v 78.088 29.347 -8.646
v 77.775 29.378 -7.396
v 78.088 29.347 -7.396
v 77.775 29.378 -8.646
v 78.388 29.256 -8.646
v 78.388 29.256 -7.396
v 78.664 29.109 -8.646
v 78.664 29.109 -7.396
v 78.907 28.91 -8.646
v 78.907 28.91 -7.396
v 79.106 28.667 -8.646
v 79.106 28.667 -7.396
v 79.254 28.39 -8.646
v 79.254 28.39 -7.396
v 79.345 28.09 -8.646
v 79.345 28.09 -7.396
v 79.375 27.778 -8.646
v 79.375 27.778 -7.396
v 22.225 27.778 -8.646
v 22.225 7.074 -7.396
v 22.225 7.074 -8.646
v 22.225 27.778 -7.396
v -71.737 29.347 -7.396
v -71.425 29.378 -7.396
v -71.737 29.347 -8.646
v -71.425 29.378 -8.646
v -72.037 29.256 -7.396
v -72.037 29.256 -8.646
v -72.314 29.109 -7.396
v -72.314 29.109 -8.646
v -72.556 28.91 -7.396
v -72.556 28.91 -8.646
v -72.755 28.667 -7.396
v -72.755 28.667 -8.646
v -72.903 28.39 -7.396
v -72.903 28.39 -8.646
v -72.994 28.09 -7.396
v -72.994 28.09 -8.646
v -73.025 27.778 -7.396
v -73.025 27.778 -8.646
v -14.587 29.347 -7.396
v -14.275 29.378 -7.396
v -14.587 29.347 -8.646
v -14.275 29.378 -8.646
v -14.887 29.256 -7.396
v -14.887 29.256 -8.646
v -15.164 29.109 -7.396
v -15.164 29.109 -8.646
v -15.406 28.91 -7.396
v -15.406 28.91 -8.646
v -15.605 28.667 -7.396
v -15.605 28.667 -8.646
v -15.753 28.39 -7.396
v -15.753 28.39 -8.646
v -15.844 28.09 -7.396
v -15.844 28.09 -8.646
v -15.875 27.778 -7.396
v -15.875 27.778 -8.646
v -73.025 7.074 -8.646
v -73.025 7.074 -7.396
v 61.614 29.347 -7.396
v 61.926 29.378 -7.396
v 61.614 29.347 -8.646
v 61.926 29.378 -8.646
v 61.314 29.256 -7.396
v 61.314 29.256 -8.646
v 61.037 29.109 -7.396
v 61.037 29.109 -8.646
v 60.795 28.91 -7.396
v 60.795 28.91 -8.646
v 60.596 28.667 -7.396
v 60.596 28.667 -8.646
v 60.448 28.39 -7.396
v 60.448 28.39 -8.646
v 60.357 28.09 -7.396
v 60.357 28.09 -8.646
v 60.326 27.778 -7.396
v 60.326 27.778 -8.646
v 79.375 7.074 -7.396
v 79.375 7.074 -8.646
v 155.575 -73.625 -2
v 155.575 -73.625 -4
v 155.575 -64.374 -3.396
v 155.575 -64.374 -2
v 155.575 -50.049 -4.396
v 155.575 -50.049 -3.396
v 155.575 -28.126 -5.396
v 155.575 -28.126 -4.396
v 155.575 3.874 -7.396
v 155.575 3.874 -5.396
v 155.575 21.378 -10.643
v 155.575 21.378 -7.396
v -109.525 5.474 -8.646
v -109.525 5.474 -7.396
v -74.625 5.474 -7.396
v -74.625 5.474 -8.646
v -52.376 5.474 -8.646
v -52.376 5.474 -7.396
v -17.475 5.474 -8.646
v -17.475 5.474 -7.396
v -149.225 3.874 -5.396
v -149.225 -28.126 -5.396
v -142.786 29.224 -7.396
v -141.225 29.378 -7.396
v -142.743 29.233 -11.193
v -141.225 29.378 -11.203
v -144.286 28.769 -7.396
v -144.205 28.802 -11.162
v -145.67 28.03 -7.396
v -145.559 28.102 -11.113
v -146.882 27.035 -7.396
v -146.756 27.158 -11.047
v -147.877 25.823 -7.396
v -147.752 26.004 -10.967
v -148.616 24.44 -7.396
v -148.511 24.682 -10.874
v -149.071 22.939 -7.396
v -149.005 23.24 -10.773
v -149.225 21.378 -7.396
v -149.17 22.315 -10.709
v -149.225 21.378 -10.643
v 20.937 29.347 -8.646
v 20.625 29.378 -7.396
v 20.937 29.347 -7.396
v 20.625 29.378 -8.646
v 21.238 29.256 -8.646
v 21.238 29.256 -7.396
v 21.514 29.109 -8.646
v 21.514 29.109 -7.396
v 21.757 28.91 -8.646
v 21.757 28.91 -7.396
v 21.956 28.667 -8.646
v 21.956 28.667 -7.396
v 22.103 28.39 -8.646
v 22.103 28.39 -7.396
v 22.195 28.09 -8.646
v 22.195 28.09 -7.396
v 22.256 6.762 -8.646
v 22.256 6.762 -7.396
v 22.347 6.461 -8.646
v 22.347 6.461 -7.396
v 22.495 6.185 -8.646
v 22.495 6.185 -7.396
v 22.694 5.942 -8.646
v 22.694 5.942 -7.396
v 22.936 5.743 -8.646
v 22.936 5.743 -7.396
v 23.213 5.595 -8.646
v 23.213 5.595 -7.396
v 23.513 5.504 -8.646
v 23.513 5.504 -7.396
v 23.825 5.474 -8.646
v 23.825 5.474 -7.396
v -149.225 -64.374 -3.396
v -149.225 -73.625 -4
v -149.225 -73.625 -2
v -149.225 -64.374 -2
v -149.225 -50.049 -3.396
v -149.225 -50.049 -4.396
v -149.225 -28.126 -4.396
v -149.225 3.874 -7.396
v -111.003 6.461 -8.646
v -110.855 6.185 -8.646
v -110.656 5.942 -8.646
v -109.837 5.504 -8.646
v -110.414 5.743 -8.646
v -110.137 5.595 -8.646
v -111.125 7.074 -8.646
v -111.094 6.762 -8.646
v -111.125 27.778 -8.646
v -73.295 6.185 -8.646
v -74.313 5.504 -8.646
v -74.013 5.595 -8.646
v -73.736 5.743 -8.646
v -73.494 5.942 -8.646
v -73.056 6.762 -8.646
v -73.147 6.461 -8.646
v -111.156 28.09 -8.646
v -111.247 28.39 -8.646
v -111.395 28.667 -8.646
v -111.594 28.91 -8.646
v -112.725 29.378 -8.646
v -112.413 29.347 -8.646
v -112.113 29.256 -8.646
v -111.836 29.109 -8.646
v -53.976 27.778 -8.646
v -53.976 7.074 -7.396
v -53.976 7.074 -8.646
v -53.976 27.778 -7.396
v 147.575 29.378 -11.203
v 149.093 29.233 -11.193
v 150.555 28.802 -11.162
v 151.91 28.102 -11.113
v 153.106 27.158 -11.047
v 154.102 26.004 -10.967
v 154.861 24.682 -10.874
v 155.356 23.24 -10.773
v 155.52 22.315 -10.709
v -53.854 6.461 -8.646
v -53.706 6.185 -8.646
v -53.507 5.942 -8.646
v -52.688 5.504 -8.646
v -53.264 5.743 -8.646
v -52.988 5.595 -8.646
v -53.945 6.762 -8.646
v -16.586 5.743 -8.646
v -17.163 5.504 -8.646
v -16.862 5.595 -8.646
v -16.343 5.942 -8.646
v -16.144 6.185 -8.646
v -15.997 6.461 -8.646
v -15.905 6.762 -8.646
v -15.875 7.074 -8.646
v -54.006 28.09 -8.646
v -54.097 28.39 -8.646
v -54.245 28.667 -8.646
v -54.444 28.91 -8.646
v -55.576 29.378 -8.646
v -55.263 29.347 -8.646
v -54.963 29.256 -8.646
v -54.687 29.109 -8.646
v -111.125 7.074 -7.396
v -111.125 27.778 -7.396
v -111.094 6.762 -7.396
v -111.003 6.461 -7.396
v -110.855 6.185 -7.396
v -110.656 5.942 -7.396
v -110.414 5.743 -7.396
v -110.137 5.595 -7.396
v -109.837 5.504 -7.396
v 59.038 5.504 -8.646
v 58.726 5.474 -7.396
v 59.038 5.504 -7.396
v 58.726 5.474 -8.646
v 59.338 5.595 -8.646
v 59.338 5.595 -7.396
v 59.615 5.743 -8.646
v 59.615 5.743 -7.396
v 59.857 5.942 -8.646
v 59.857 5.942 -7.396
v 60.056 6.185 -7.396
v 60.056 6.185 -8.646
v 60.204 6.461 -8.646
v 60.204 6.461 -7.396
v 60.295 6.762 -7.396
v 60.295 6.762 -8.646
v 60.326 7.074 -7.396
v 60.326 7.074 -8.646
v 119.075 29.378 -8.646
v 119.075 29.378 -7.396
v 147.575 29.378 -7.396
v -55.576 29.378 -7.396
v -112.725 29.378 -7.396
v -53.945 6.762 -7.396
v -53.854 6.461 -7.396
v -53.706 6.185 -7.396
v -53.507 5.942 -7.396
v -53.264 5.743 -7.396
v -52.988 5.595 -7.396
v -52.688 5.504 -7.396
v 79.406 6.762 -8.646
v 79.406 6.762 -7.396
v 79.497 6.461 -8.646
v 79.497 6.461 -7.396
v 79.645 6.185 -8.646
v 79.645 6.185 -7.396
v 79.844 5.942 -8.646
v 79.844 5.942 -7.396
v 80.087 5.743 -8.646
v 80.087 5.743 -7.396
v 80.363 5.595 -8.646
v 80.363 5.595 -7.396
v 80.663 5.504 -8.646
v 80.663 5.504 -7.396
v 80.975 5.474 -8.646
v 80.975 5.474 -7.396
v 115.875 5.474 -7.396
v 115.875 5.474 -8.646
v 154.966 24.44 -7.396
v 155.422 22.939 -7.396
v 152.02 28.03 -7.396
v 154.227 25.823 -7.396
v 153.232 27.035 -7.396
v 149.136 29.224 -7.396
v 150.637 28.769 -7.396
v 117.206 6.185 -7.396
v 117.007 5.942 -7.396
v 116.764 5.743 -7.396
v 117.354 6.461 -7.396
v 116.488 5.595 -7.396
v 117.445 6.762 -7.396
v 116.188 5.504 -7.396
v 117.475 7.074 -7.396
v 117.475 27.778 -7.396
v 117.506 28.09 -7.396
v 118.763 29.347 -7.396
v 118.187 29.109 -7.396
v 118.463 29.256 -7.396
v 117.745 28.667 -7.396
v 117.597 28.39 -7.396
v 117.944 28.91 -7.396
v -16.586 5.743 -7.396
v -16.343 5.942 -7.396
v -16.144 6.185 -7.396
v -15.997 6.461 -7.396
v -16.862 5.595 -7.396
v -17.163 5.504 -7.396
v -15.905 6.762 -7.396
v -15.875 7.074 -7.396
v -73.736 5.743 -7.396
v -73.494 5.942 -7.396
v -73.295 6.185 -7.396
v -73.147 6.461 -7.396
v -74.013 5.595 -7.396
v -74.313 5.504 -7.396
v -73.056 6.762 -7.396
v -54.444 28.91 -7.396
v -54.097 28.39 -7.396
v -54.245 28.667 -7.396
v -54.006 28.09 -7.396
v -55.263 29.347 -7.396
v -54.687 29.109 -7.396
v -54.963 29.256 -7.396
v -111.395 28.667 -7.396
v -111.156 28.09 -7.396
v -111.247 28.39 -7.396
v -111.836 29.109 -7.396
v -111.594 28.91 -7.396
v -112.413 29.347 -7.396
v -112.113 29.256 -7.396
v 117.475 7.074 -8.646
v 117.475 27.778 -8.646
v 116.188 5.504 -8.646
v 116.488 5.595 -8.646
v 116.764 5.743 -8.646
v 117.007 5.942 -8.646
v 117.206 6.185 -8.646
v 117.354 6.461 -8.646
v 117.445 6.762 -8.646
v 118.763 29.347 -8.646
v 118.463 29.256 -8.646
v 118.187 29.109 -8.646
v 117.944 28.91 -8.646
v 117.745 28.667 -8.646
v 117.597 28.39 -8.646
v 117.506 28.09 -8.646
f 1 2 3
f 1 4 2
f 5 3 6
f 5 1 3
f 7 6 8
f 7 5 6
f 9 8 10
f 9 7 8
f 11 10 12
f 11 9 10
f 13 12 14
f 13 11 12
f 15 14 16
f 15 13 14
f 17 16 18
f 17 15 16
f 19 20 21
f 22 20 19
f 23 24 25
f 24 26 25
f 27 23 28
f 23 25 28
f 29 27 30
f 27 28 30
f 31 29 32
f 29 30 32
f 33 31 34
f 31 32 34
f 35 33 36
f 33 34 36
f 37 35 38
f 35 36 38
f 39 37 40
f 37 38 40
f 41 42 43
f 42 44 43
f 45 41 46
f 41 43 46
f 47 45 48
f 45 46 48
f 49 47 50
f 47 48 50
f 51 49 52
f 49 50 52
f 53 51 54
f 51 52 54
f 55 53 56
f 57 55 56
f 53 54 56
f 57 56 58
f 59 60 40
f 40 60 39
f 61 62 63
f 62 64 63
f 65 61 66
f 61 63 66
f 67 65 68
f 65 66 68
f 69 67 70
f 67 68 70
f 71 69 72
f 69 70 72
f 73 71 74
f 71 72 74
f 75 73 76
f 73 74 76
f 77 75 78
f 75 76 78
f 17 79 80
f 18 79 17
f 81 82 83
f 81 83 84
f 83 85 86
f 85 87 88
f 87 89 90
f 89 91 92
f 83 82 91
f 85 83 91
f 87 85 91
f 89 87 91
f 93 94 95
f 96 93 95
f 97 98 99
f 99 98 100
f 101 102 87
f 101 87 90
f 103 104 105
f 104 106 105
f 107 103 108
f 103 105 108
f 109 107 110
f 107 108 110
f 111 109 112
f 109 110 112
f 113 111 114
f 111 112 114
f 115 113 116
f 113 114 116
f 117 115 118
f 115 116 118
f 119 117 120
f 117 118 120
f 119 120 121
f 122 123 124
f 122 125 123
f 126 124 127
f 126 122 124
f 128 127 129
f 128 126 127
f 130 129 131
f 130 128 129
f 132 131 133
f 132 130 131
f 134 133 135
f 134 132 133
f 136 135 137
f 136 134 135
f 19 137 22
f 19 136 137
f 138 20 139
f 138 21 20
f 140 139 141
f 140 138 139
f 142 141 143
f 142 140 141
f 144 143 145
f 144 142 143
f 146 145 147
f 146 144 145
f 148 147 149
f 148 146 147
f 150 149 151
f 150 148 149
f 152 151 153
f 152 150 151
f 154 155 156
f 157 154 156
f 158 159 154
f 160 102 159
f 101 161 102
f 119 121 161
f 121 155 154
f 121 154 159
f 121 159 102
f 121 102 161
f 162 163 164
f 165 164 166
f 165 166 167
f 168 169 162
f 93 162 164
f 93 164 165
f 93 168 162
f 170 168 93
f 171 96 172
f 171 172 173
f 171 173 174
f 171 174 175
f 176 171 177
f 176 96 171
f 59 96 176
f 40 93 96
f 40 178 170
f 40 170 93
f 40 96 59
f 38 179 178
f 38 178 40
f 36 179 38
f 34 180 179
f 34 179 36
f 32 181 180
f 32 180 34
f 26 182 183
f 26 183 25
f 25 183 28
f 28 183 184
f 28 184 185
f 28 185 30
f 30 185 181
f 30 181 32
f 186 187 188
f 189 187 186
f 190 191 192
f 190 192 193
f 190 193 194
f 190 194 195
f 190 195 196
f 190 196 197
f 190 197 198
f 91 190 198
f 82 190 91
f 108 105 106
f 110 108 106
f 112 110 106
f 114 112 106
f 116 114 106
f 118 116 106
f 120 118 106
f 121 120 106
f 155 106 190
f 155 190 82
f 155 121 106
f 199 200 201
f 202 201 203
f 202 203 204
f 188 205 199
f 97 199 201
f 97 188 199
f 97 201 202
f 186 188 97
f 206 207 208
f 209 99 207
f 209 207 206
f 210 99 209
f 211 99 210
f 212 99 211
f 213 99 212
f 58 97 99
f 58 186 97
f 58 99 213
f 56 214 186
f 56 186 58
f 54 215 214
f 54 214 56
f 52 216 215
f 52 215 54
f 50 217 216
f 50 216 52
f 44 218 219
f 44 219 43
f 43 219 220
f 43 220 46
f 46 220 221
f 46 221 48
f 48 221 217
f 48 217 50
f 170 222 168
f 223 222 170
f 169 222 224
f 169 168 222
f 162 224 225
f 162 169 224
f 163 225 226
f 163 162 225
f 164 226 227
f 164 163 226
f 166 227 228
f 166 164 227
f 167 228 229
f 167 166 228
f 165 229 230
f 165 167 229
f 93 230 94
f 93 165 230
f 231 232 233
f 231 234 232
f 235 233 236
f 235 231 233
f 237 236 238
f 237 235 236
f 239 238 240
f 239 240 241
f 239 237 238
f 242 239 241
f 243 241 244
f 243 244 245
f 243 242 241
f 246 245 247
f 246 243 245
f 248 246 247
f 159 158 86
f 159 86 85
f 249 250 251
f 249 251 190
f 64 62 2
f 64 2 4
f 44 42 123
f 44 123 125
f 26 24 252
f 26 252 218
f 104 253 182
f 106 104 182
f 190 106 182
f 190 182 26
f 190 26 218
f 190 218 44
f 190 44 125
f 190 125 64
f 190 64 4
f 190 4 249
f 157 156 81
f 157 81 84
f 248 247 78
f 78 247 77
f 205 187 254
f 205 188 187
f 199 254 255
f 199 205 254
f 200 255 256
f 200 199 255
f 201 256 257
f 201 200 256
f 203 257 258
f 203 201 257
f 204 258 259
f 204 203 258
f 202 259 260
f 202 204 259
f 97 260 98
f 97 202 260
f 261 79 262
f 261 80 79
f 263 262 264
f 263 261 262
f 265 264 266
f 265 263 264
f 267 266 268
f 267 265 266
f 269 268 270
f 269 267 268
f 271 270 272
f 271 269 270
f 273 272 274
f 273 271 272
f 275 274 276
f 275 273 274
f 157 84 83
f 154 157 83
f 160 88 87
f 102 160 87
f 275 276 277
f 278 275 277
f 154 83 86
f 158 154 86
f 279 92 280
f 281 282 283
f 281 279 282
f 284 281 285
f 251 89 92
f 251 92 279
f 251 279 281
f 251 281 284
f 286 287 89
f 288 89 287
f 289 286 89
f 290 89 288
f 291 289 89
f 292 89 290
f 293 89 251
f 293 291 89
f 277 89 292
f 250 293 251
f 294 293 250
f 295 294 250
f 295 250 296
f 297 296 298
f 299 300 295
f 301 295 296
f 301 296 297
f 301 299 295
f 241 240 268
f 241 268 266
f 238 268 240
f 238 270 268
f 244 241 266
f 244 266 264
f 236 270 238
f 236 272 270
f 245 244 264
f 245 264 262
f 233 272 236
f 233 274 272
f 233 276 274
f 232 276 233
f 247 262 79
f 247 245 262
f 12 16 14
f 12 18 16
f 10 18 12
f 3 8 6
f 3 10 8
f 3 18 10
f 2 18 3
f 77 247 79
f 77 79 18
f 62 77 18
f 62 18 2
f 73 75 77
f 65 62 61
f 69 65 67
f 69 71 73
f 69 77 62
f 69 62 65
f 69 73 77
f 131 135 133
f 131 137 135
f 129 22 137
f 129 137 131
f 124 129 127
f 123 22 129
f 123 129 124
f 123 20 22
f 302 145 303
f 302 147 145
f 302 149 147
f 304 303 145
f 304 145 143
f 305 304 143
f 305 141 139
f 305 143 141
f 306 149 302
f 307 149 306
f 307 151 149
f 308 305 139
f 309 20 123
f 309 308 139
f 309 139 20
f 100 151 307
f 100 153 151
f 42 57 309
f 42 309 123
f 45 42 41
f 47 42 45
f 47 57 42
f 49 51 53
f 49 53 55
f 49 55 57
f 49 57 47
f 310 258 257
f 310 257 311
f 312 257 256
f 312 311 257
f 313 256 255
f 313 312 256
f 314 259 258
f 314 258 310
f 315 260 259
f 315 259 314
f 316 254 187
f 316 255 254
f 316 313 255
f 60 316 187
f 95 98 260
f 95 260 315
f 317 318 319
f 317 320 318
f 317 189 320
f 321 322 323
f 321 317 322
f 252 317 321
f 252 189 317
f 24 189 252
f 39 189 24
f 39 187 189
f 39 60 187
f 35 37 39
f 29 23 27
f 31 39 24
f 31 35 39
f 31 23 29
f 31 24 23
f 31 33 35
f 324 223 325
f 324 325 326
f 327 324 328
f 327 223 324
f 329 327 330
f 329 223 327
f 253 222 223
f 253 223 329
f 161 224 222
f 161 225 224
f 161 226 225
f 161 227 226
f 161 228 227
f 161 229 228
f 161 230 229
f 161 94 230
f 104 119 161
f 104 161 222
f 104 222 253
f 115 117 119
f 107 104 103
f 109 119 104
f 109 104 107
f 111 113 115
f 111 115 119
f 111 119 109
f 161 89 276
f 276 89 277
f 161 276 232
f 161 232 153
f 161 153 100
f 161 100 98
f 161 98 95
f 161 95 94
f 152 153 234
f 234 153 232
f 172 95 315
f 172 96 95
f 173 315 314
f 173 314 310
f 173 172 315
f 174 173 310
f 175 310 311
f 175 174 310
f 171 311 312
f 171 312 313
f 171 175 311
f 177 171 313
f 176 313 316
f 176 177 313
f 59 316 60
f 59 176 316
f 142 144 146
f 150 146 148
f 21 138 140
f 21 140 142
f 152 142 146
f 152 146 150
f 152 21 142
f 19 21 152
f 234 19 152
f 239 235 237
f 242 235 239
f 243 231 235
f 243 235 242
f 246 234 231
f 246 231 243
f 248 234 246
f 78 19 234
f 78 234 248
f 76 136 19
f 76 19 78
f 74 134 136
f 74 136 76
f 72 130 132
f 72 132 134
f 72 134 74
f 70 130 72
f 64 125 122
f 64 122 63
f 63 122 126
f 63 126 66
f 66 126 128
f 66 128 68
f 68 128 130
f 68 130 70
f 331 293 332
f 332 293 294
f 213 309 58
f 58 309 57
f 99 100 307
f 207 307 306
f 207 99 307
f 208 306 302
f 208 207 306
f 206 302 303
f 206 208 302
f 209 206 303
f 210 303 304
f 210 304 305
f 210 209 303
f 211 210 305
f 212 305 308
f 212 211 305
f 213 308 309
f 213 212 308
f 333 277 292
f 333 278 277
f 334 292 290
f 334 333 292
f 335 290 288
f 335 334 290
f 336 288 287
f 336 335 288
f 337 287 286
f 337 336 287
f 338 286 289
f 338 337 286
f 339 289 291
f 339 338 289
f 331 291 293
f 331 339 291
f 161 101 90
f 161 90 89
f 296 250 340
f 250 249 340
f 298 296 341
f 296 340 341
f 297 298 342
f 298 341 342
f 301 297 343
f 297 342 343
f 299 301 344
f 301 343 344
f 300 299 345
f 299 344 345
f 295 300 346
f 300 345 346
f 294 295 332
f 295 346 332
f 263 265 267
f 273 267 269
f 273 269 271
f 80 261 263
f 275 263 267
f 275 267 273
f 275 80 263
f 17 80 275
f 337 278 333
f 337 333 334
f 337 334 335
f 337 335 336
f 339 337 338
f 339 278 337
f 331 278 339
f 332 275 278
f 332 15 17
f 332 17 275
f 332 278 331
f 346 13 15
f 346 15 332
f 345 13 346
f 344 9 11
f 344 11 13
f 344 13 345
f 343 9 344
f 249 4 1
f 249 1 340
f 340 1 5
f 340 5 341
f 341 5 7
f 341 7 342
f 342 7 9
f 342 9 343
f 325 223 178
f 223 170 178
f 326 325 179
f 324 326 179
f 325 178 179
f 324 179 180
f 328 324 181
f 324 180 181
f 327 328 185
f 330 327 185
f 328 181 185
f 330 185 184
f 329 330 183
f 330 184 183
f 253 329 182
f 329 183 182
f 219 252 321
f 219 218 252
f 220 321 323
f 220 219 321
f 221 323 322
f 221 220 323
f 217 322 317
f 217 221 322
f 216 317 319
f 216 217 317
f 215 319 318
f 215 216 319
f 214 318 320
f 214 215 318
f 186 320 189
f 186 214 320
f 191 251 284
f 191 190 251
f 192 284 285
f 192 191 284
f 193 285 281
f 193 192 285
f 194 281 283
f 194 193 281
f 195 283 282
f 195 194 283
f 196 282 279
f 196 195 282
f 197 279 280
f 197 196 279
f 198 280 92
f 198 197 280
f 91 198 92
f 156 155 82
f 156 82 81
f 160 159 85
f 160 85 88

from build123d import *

# Parameters (mm, degrees)
BOSS_EXTRUDE1_DEPTH = 304.800275
FILLET1_R           = 8
SKETCH2_W           = 38.10085
SKETCH2_H           = 23.904524524
SKETCH2_W_2         = 38.1
CUT_EXTRUDE1_DEPTH  = 1.25
FILLET2_R           = 1.6
FILLET3_R           = 1.6


with BuildPart() as part:
    # Sketch1 → Boss-Extrude1 (new body)
    with BuildSketch(Plane.ZY.offset(149.225)):
        Polygon((-2, -64.3742065), (-3.3962, -64.3742065), (-3.3962, -50.048837521), (-4.3962, -50.048837521), (-4.3962, -28.126347), (-5.3962, -28.126347), (-5.3962, 3.873653), (-7.3962, 3.873653), (-7.3962, 29.378177524), (-11.202667042, 29.378177524), (-4, -73.62476), (-2, -73.62476), align=None)
    extrude(amount=-BOSS_EXTRUDE1_DEPTH)

    # Fillet1
    fillet1_edges = [part.edges().sort_by_distance(p)[0] for p in [
        (-149.225, 29.378177524, -9.299433521),
        (155.575275, 29.378177524, -9.299433521),
    ]]
    fillet(fillet1_edges, radius=FILLET1_R)

    # Sketch2 → Cut-Extrude1 (cut)
    with BuildSketch(Plane.XY.offset(-7.3962)):
        with Locations((41.2757, 17.425915262)):
            Rectangle(SKETCH2_W, SKETCH2_H)
        with Locations((-92.074875, 17.425915262)):
            Rectangle(SKETCH2_W_2, SKETCH2_H)
        with Locations((-34.92515, 17.425915262)):
            Rectangle(SKETCH2_W, SKETCH2_H)
        with Locations((98.425425, 17.425915262)):
            Rectangle(SKETCH2_W_2, SKETCH2_H)
    extrude(amount=-CUT_EXTRUDE1_DEPTH, mode=Mode.SUBTRACT)

    # Fillet2
    fillet2_edges = [part.edges().sort_by_distance(p)[0] for p in [
        (-111.124875, 5.473653, -8.0212),
        (-73.024875, 5.473653, -8.0212),
        (-53.975575, 5.473653, -8.0212),
        (-15.874725, 5.473653, -8.0212),
        (60.326125, 5.473653, -8.0212),
        (22.225275, 5.473653, -8.0212),
        (117.475425, 5.473653, -8.0212),
        (79.375425, 5.473653, -8.0212),
    ]]
    fillet(fillet2_edges, radius=FILLET2_R)

    # Fillet3
    fillet3_edges = [part.edges().sort_by_distance(p)[0] for p in [
        (-111.124875, 29.378177524, -8.0212),
        (-73.024875, 29.378177524, -8.0212),
        (-53.975575, 29.378177524, -8.0212),
        (-15.874725, 29.378177524, -8.0212),
        (22.225275, 29.378177524, -8.0212),
        (60.326125, 29.378177524, -8.0212),
        (79.375425, 29.378177524, -8.0212),
        (117.475425, 29.378177524, -8.0212),
    ]]
    fillet(fillet3_edges, radius=FILLET3_R)


solid = part.part
